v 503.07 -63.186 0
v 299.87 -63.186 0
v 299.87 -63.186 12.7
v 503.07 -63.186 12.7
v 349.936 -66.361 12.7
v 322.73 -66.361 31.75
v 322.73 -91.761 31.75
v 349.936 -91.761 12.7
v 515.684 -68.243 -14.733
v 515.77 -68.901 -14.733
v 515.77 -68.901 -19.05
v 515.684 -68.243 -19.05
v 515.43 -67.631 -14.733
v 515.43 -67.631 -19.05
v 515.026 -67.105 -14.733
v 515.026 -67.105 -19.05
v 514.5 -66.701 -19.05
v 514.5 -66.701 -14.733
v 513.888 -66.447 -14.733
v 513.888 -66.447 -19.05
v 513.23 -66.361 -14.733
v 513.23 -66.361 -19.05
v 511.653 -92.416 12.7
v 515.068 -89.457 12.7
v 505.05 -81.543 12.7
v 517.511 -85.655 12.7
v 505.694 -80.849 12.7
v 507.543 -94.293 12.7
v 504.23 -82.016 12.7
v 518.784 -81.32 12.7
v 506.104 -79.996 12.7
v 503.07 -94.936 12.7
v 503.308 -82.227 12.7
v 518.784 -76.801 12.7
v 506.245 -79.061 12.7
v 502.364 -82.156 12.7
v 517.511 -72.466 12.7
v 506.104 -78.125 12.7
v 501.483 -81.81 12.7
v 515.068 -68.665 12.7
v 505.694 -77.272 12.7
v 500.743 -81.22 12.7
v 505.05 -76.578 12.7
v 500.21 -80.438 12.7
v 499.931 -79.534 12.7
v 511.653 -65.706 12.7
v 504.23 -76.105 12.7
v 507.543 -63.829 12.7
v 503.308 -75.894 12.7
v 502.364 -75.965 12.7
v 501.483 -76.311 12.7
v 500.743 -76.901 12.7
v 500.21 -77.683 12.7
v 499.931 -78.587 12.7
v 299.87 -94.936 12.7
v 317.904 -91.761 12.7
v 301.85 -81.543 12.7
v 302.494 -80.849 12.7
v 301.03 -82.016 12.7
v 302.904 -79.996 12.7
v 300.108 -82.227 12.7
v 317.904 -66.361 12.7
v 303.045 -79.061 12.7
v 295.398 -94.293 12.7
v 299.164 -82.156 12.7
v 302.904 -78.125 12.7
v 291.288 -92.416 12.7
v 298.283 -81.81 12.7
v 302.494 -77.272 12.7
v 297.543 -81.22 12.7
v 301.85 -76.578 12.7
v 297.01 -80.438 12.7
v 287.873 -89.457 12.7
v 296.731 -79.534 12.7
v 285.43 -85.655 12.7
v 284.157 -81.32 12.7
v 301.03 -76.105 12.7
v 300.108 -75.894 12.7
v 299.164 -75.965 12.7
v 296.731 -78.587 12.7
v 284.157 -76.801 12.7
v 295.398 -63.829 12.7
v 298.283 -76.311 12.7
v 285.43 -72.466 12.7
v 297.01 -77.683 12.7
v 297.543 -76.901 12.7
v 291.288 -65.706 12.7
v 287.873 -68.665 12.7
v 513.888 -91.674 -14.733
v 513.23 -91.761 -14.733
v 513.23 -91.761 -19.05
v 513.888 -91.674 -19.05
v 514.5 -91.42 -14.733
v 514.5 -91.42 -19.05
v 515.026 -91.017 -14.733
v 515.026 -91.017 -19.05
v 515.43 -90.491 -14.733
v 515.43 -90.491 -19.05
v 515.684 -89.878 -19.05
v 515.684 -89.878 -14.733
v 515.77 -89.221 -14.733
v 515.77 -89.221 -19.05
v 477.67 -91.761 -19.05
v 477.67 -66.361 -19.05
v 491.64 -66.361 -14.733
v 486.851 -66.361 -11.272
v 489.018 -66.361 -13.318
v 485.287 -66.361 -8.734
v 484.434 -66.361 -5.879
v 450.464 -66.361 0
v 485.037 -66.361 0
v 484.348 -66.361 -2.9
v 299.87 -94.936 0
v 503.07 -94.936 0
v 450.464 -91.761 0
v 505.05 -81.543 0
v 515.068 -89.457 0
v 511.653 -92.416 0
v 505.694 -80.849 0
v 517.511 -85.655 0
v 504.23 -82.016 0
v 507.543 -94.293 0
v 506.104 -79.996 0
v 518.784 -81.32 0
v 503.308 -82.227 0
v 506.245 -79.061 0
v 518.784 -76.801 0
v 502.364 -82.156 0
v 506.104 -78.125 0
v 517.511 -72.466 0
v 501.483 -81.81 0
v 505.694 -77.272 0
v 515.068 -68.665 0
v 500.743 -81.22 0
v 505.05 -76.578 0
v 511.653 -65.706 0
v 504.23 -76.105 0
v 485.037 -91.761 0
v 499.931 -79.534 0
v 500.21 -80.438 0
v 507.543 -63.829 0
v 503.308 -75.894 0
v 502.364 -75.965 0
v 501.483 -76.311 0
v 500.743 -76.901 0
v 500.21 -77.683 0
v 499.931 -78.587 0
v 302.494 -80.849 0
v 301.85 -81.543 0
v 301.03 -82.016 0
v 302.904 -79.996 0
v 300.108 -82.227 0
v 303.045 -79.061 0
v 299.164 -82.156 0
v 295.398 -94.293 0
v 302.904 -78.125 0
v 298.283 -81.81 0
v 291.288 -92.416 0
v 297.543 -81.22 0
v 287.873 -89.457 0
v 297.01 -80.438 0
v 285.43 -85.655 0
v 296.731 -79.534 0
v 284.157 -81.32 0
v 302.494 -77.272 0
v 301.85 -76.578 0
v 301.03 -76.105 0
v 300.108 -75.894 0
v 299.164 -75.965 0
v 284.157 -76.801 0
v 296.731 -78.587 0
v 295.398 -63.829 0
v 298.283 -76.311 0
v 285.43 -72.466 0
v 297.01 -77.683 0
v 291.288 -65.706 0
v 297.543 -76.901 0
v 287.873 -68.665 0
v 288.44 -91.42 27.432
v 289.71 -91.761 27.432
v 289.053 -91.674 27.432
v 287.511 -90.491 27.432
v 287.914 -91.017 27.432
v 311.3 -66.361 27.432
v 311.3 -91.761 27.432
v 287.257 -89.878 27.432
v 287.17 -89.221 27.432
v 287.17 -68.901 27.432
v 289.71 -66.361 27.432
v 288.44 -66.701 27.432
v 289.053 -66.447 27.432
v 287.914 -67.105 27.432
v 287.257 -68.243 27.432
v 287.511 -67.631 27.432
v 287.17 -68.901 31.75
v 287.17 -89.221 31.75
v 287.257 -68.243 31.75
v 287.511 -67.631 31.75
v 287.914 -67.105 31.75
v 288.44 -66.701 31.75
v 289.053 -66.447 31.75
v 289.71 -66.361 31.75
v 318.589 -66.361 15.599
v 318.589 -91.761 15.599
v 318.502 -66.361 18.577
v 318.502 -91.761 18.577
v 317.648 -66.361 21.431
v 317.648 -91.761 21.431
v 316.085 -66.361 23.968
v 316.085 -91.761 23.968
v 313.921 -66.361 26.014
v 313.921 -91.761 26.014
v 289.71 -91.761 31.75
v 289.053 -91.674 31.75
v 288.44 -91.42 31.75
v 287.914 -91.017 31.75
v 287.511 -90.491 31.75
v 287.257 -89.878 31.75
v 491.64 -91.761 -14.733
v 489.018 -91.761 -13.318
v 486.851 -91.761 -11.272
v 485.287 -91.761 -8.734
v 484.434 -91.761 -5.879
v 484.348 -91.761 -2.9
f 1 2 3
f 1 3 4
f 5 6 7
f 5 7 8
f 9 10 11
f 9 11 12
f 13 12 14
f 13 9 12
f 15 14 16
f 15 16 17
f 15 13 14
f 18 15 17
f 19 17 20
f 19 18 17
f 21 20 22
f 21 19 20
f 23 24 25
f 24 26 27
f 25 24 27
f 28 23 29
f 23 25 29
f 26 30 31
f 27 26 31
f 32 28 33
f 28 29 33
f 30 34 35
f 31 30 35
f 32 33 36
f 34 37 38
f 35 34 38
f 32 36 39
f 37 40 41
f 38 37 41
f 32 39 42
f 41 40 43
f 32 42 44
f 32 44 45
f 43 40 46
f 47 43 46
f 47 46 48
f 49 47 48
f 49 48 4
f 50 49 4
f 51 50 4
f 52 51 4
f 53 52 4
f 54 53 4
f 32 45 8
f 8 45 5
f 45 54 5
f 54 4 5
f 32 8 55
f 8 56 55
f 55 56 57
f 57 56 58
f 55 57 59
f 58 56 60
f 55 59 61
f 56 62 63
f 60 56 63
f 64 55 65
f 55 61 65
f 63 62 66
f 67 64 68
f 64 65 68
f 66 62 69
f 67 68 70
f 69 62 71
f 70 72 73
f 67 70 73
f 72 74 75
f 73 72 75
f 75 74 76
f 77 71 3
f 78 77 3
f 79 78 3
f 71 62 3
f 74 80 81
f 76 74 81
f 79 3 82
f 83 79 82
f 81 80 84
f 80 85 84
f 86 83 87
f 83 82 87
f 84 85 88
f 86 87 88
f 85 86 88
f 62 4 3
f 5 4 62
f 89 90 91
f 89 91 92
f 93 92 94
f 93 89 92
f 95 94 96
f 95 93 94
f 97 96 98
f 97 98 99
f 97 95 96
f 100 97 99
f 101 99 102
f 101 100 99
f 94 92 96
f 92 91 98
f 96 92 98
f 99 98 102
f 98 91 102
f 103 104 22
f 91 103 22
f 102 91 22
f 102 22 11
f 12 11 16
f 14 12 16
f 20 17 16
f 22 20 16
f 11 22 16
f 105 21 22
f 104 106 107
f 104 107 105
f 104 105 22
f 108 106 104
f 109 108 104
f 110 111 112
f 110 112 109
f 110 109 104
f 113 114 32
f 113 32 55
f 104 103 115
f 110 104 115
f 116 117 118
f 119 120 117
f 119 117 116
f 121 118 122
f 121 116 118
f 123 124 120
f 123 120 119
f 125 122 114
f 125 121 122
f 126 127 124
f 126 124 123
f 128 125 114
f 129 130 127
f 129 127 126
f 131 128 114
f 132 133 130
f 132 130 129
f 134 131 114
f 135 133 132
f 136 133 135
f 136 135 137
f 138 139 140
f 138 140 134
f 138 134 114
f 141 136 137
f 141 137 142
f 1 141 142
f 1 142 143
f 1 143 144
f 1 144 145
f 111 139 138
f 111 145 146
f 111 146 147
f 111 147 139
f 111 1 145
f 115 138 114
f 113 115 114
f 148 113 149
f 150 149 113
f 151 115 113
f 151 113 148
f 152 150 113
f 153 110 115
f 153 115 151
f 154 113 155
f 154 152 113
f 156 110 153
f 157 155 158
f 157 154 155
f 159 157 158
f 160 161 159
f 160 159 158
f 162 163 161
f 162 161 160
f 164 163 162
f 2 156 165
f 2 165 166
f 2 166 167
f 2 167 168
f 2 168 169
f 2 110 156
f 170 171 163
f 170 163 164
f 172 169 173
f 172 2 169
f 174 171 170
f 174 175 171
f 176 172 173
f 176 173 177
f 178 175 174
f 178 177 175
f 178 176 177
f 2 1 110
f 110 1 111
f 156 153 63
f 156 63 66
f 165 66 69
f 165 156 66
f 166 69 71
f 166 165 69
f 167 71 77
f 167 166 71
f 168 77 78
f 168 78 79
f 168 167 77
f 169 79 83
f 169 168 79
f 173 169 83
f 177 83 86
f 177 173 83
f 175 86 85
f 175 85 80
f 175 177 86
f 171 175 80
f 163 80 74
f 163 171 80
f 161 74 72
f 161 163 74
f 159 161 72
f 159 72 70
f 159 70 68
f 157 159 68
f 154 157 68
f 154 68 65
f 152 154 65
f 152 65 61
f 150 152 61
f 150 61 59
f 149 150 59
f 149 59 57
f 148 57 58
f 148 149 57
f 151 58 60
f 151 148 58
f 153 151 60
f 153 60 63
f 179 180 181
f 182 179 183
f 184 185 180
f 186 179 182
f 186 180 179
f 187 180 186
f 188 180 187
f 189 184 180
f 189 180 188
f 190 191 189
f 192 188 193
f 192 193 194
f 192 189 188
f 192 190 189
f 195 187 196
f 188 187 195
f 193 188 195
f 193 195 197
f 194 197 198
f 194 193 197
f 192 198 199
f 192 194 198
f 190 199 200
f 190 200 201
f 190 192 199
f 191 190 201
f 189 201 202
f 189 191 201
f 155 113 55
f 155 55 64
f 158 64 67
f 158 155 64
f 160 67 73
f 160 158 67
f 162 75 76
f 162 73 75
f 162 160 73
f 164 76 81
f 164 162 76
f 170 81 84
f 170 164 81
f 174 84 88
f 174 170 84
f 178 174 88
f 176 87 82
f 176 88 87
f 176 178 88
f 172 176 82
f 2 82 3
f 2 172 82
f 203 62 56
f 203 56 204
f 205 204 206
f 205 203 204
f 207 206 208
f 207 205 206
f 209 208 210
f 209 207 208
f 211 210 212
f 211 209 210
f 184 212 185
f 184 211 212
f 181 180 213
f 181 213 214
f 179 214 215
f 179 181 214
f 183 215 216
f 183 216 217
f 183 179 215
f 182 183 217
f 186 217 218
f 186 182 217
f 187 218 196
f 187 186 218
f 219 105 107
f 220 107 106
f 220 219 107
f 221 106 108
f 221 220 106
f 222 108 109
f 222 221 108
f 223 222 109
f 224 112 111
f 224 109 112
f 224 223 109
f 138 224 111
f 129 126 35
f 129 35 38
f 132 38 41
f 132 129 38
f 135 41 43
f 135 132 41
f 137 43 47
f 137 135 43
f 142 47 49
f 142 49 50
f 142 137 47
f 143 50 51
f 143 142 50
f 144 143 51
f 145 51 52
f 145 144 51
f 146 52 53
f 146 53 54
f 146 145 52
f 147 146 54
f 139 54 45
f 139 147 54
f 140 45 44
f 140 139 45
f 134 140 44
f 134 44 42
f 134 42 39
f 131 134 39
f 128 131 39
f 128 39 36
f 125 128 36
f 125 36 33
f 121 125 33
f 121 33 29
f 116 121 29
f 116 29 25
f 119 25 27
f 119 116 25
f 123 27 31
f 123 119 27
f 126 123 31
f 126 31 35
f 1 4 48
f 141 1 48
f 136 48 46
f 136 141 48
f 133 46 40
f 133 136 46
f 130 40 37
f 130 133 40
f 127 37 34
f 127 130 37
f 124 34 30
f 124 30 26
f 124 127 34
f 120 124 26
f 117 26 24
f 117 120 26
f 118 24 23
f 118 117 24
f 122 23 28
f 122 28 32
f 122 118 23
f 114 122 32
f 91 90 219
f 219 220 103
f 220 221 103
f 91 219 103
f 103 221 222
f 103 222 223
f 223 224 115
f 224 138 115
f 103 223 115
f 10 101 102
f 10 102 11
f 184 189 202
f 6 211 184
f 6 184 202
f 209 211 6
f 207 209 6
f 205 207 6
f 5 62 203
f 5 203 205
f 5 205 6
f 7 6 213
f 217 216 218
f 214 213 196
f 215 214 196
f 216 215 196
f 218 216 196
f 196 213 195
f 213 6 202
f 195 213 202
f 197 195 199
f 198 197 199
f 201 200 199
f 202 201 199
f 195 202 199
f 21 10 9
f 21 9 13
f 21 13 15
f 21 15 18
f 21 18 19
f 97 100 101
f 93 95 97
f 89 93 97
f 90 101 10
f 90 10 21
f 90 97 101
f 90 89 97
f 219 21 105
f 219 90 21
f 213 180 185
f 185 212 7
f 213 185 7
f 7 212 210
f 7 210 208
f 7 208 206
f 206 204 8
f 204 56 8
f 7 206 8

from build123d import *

# Parameters (mm, degrees)
SKETCH1_R           = 3.175
BOSS_EXTRUDE1_DEPTH = 12.7
BOSS_EXTRUDE2_DEPTH = 19.05
CUT_EXTRUDE2_DEPTH  = 30.48
BOSS_EXTRUDE7_DEPTH = 25.4
BOSS_EXTRUDE8_DEPTH = 19.05
CUT_EXTRUDE3_DEPTH  = 41.148
BOSS_EXTRUDE9_DEPTH = 25.4


with BuildPart() as part:
    # Sketch1 → Boss-Extrude1 (new body)
    with BuildSketch(Plane.XY):
        with BuildLine():
            Line((299.870251741, -63.185614448), (503.070251741, -63.185614448))
            ThreePointArc((503.070251741, -63.185614448), (518.945251741, -79.060614448), (503.070251741, -94.935614448))
            Line((503.070251741, -94.935614448), (299.870251741, -94.935614448))
            ThreePointArc((299.870251741, -94.935614448), (283.995251741, -79.060614448), (299.870251741, -63.185614448))
        make_face()
        with Locations((299.870251741, -79.060614448)):
            Circle(SKETCH1_R, mode=Mode.SUBTRACT)
        with Locations((503.070251741, -79.060614448)):
            Circle(SKETCH1_R, mode=Mode.SUBTRACT)
    extrude(amount=BOSS_EXTRUDE1_DEPTH)

    # Sketch2 → Boss-Extrude2 (add)
    with BuildSketch(Plane(origin=(0, 0, 0), x_dir=(-1, 0, 0), z_dir=(0, 0, -1))):
        with BuildLine():
            Line((-477.670251741, -66.360614448), (-477.670251741, -91.760614448))
            Line((-477.670251741, -91.760614448), (-513.230251741, -91.760614448))
            ThreePointArc((-513.230251741, -91.760614448), (-515.026302965, -91.016665672), (-515.770251741, -89.220614448))
            Line((-515.770251741, -89.220614448), (-515.770251741, -68.900614448))
            ThreePointArc((-515.770251741, -68.900614448), (-515.026302965, -67.104563223), (-513.230251741, -66.360614448))
            Line((-513.230251741, -66.360614448), (-477.670251741, -66.360614448))
        make_face()
    extrude(amount=BOSS_EXTRUDE2_DEPTH)

    # Sketch6 → Cut-Extrude2 (cut)
    with BuildSketch(Plane.XZ.offset(91.760614448)):
        with BuildLine():
            Line((499.246061033, 0), (515.770251741, 0))
            Line((515.770251741, 0), (515.770251741, -14.733462418))
            Line((515.770251741, -14.733462418), (491.640251741, -14.733462418))
            ThreePointArc((491.640251741, -14.733462418), (485.287193282, -8.73432293), (485.036934778, 0))
            Line((485.036934778, 0), (488.908392954, 0))
            Line((488.908392954, 0), (499.246061033, 0))
        make_face()
    extrude(amount=-CUT_EXTRUDE2_DEPTH, mode=Mode.SUBTRACT)

    # Sketch4 → Boss-Extrude7 (add)
    with BuildSketch(Plane.XZ.offset(91.760614448)):
        Polygon((477.670251741, -19.05), (450.464032212, 0), (477.670251741, 0), align=None)
    extrude(amount=-BOSS_EXTRUDE7_DEPTH)

    # Sketch7 → Boss-Extrude8 (add)
    with BuildSketch(Plane.XY.offset(12.7)):
        with BuildLine():
            Line((310.030251741, -66.360614448), (312.570251741, -66.360614448))
            Line((312.570251741, -66.360614448), (322.730251741, -66.360614448))
            Line((322.730251741, -66.360614448), (322.730251741, -91.760614448))
            Line((322.730251741, -91.760614448), (310.030251741, -91.760614448))
            Line((310.030251741, -91.760614448), (289.710251741, -91.760614448))
            ThreePointArc((289.710251741, -91.760614448), (287.914200517, -91.016665672), (287.170251741, -89.220614448))
            Line((287.170251741, -89.220614448), (287.170251741, -68.900614448))
            ThreePointArc((287.170251741, -68.900614448), (287.914200517, -67.104563223), (289.710251741, -66.360614448))
            Line((289.710251741, -66.360614448), (310.030251741, -66.360614448))
        make_face()
    extrude(amount=BOSS_EXTRUDE8_DEPTH)

    # Sketch8 → Cut-Extrude3 (cut)
    with BuildSketch(Plane(origin=(0, -66.360614448, 0), x_dir=(1, 0, 0), z_dir=(0, 1, 0))):
        with BuildLine():
            Line((287.170251741, -12.7), (317.904251741, -12.7))
            ThreePointArc((317.904251741, -12.7), (317.648023156, -21.431345807), (311.300251741, -27.432))
            Line((311.300251741, -27.432), (287.170251741, -27.432))
            Line((287.170251741, -27.432), (287.170251741, -12.7))
        make_face()
    extrude(amount=-CUT_EXTRUDE3_DEPTH, mode=Mode.SUBTRACT)

    # Sketch9 → Boss-Extrude9 (add)
    with BuildSketch(Plane(origin=(0, -66.360614448, 0), x_dir=(1, 0, 0), z_dir=(0, 1, 0))):
        Polygon((322.730251741, -31.75), (349.936471269, -12.7), (322.730251741, -12.7), align=None)
    extrude(amount=-BOSS_EXTRUDE9_DEPTH)


solid = part.part
